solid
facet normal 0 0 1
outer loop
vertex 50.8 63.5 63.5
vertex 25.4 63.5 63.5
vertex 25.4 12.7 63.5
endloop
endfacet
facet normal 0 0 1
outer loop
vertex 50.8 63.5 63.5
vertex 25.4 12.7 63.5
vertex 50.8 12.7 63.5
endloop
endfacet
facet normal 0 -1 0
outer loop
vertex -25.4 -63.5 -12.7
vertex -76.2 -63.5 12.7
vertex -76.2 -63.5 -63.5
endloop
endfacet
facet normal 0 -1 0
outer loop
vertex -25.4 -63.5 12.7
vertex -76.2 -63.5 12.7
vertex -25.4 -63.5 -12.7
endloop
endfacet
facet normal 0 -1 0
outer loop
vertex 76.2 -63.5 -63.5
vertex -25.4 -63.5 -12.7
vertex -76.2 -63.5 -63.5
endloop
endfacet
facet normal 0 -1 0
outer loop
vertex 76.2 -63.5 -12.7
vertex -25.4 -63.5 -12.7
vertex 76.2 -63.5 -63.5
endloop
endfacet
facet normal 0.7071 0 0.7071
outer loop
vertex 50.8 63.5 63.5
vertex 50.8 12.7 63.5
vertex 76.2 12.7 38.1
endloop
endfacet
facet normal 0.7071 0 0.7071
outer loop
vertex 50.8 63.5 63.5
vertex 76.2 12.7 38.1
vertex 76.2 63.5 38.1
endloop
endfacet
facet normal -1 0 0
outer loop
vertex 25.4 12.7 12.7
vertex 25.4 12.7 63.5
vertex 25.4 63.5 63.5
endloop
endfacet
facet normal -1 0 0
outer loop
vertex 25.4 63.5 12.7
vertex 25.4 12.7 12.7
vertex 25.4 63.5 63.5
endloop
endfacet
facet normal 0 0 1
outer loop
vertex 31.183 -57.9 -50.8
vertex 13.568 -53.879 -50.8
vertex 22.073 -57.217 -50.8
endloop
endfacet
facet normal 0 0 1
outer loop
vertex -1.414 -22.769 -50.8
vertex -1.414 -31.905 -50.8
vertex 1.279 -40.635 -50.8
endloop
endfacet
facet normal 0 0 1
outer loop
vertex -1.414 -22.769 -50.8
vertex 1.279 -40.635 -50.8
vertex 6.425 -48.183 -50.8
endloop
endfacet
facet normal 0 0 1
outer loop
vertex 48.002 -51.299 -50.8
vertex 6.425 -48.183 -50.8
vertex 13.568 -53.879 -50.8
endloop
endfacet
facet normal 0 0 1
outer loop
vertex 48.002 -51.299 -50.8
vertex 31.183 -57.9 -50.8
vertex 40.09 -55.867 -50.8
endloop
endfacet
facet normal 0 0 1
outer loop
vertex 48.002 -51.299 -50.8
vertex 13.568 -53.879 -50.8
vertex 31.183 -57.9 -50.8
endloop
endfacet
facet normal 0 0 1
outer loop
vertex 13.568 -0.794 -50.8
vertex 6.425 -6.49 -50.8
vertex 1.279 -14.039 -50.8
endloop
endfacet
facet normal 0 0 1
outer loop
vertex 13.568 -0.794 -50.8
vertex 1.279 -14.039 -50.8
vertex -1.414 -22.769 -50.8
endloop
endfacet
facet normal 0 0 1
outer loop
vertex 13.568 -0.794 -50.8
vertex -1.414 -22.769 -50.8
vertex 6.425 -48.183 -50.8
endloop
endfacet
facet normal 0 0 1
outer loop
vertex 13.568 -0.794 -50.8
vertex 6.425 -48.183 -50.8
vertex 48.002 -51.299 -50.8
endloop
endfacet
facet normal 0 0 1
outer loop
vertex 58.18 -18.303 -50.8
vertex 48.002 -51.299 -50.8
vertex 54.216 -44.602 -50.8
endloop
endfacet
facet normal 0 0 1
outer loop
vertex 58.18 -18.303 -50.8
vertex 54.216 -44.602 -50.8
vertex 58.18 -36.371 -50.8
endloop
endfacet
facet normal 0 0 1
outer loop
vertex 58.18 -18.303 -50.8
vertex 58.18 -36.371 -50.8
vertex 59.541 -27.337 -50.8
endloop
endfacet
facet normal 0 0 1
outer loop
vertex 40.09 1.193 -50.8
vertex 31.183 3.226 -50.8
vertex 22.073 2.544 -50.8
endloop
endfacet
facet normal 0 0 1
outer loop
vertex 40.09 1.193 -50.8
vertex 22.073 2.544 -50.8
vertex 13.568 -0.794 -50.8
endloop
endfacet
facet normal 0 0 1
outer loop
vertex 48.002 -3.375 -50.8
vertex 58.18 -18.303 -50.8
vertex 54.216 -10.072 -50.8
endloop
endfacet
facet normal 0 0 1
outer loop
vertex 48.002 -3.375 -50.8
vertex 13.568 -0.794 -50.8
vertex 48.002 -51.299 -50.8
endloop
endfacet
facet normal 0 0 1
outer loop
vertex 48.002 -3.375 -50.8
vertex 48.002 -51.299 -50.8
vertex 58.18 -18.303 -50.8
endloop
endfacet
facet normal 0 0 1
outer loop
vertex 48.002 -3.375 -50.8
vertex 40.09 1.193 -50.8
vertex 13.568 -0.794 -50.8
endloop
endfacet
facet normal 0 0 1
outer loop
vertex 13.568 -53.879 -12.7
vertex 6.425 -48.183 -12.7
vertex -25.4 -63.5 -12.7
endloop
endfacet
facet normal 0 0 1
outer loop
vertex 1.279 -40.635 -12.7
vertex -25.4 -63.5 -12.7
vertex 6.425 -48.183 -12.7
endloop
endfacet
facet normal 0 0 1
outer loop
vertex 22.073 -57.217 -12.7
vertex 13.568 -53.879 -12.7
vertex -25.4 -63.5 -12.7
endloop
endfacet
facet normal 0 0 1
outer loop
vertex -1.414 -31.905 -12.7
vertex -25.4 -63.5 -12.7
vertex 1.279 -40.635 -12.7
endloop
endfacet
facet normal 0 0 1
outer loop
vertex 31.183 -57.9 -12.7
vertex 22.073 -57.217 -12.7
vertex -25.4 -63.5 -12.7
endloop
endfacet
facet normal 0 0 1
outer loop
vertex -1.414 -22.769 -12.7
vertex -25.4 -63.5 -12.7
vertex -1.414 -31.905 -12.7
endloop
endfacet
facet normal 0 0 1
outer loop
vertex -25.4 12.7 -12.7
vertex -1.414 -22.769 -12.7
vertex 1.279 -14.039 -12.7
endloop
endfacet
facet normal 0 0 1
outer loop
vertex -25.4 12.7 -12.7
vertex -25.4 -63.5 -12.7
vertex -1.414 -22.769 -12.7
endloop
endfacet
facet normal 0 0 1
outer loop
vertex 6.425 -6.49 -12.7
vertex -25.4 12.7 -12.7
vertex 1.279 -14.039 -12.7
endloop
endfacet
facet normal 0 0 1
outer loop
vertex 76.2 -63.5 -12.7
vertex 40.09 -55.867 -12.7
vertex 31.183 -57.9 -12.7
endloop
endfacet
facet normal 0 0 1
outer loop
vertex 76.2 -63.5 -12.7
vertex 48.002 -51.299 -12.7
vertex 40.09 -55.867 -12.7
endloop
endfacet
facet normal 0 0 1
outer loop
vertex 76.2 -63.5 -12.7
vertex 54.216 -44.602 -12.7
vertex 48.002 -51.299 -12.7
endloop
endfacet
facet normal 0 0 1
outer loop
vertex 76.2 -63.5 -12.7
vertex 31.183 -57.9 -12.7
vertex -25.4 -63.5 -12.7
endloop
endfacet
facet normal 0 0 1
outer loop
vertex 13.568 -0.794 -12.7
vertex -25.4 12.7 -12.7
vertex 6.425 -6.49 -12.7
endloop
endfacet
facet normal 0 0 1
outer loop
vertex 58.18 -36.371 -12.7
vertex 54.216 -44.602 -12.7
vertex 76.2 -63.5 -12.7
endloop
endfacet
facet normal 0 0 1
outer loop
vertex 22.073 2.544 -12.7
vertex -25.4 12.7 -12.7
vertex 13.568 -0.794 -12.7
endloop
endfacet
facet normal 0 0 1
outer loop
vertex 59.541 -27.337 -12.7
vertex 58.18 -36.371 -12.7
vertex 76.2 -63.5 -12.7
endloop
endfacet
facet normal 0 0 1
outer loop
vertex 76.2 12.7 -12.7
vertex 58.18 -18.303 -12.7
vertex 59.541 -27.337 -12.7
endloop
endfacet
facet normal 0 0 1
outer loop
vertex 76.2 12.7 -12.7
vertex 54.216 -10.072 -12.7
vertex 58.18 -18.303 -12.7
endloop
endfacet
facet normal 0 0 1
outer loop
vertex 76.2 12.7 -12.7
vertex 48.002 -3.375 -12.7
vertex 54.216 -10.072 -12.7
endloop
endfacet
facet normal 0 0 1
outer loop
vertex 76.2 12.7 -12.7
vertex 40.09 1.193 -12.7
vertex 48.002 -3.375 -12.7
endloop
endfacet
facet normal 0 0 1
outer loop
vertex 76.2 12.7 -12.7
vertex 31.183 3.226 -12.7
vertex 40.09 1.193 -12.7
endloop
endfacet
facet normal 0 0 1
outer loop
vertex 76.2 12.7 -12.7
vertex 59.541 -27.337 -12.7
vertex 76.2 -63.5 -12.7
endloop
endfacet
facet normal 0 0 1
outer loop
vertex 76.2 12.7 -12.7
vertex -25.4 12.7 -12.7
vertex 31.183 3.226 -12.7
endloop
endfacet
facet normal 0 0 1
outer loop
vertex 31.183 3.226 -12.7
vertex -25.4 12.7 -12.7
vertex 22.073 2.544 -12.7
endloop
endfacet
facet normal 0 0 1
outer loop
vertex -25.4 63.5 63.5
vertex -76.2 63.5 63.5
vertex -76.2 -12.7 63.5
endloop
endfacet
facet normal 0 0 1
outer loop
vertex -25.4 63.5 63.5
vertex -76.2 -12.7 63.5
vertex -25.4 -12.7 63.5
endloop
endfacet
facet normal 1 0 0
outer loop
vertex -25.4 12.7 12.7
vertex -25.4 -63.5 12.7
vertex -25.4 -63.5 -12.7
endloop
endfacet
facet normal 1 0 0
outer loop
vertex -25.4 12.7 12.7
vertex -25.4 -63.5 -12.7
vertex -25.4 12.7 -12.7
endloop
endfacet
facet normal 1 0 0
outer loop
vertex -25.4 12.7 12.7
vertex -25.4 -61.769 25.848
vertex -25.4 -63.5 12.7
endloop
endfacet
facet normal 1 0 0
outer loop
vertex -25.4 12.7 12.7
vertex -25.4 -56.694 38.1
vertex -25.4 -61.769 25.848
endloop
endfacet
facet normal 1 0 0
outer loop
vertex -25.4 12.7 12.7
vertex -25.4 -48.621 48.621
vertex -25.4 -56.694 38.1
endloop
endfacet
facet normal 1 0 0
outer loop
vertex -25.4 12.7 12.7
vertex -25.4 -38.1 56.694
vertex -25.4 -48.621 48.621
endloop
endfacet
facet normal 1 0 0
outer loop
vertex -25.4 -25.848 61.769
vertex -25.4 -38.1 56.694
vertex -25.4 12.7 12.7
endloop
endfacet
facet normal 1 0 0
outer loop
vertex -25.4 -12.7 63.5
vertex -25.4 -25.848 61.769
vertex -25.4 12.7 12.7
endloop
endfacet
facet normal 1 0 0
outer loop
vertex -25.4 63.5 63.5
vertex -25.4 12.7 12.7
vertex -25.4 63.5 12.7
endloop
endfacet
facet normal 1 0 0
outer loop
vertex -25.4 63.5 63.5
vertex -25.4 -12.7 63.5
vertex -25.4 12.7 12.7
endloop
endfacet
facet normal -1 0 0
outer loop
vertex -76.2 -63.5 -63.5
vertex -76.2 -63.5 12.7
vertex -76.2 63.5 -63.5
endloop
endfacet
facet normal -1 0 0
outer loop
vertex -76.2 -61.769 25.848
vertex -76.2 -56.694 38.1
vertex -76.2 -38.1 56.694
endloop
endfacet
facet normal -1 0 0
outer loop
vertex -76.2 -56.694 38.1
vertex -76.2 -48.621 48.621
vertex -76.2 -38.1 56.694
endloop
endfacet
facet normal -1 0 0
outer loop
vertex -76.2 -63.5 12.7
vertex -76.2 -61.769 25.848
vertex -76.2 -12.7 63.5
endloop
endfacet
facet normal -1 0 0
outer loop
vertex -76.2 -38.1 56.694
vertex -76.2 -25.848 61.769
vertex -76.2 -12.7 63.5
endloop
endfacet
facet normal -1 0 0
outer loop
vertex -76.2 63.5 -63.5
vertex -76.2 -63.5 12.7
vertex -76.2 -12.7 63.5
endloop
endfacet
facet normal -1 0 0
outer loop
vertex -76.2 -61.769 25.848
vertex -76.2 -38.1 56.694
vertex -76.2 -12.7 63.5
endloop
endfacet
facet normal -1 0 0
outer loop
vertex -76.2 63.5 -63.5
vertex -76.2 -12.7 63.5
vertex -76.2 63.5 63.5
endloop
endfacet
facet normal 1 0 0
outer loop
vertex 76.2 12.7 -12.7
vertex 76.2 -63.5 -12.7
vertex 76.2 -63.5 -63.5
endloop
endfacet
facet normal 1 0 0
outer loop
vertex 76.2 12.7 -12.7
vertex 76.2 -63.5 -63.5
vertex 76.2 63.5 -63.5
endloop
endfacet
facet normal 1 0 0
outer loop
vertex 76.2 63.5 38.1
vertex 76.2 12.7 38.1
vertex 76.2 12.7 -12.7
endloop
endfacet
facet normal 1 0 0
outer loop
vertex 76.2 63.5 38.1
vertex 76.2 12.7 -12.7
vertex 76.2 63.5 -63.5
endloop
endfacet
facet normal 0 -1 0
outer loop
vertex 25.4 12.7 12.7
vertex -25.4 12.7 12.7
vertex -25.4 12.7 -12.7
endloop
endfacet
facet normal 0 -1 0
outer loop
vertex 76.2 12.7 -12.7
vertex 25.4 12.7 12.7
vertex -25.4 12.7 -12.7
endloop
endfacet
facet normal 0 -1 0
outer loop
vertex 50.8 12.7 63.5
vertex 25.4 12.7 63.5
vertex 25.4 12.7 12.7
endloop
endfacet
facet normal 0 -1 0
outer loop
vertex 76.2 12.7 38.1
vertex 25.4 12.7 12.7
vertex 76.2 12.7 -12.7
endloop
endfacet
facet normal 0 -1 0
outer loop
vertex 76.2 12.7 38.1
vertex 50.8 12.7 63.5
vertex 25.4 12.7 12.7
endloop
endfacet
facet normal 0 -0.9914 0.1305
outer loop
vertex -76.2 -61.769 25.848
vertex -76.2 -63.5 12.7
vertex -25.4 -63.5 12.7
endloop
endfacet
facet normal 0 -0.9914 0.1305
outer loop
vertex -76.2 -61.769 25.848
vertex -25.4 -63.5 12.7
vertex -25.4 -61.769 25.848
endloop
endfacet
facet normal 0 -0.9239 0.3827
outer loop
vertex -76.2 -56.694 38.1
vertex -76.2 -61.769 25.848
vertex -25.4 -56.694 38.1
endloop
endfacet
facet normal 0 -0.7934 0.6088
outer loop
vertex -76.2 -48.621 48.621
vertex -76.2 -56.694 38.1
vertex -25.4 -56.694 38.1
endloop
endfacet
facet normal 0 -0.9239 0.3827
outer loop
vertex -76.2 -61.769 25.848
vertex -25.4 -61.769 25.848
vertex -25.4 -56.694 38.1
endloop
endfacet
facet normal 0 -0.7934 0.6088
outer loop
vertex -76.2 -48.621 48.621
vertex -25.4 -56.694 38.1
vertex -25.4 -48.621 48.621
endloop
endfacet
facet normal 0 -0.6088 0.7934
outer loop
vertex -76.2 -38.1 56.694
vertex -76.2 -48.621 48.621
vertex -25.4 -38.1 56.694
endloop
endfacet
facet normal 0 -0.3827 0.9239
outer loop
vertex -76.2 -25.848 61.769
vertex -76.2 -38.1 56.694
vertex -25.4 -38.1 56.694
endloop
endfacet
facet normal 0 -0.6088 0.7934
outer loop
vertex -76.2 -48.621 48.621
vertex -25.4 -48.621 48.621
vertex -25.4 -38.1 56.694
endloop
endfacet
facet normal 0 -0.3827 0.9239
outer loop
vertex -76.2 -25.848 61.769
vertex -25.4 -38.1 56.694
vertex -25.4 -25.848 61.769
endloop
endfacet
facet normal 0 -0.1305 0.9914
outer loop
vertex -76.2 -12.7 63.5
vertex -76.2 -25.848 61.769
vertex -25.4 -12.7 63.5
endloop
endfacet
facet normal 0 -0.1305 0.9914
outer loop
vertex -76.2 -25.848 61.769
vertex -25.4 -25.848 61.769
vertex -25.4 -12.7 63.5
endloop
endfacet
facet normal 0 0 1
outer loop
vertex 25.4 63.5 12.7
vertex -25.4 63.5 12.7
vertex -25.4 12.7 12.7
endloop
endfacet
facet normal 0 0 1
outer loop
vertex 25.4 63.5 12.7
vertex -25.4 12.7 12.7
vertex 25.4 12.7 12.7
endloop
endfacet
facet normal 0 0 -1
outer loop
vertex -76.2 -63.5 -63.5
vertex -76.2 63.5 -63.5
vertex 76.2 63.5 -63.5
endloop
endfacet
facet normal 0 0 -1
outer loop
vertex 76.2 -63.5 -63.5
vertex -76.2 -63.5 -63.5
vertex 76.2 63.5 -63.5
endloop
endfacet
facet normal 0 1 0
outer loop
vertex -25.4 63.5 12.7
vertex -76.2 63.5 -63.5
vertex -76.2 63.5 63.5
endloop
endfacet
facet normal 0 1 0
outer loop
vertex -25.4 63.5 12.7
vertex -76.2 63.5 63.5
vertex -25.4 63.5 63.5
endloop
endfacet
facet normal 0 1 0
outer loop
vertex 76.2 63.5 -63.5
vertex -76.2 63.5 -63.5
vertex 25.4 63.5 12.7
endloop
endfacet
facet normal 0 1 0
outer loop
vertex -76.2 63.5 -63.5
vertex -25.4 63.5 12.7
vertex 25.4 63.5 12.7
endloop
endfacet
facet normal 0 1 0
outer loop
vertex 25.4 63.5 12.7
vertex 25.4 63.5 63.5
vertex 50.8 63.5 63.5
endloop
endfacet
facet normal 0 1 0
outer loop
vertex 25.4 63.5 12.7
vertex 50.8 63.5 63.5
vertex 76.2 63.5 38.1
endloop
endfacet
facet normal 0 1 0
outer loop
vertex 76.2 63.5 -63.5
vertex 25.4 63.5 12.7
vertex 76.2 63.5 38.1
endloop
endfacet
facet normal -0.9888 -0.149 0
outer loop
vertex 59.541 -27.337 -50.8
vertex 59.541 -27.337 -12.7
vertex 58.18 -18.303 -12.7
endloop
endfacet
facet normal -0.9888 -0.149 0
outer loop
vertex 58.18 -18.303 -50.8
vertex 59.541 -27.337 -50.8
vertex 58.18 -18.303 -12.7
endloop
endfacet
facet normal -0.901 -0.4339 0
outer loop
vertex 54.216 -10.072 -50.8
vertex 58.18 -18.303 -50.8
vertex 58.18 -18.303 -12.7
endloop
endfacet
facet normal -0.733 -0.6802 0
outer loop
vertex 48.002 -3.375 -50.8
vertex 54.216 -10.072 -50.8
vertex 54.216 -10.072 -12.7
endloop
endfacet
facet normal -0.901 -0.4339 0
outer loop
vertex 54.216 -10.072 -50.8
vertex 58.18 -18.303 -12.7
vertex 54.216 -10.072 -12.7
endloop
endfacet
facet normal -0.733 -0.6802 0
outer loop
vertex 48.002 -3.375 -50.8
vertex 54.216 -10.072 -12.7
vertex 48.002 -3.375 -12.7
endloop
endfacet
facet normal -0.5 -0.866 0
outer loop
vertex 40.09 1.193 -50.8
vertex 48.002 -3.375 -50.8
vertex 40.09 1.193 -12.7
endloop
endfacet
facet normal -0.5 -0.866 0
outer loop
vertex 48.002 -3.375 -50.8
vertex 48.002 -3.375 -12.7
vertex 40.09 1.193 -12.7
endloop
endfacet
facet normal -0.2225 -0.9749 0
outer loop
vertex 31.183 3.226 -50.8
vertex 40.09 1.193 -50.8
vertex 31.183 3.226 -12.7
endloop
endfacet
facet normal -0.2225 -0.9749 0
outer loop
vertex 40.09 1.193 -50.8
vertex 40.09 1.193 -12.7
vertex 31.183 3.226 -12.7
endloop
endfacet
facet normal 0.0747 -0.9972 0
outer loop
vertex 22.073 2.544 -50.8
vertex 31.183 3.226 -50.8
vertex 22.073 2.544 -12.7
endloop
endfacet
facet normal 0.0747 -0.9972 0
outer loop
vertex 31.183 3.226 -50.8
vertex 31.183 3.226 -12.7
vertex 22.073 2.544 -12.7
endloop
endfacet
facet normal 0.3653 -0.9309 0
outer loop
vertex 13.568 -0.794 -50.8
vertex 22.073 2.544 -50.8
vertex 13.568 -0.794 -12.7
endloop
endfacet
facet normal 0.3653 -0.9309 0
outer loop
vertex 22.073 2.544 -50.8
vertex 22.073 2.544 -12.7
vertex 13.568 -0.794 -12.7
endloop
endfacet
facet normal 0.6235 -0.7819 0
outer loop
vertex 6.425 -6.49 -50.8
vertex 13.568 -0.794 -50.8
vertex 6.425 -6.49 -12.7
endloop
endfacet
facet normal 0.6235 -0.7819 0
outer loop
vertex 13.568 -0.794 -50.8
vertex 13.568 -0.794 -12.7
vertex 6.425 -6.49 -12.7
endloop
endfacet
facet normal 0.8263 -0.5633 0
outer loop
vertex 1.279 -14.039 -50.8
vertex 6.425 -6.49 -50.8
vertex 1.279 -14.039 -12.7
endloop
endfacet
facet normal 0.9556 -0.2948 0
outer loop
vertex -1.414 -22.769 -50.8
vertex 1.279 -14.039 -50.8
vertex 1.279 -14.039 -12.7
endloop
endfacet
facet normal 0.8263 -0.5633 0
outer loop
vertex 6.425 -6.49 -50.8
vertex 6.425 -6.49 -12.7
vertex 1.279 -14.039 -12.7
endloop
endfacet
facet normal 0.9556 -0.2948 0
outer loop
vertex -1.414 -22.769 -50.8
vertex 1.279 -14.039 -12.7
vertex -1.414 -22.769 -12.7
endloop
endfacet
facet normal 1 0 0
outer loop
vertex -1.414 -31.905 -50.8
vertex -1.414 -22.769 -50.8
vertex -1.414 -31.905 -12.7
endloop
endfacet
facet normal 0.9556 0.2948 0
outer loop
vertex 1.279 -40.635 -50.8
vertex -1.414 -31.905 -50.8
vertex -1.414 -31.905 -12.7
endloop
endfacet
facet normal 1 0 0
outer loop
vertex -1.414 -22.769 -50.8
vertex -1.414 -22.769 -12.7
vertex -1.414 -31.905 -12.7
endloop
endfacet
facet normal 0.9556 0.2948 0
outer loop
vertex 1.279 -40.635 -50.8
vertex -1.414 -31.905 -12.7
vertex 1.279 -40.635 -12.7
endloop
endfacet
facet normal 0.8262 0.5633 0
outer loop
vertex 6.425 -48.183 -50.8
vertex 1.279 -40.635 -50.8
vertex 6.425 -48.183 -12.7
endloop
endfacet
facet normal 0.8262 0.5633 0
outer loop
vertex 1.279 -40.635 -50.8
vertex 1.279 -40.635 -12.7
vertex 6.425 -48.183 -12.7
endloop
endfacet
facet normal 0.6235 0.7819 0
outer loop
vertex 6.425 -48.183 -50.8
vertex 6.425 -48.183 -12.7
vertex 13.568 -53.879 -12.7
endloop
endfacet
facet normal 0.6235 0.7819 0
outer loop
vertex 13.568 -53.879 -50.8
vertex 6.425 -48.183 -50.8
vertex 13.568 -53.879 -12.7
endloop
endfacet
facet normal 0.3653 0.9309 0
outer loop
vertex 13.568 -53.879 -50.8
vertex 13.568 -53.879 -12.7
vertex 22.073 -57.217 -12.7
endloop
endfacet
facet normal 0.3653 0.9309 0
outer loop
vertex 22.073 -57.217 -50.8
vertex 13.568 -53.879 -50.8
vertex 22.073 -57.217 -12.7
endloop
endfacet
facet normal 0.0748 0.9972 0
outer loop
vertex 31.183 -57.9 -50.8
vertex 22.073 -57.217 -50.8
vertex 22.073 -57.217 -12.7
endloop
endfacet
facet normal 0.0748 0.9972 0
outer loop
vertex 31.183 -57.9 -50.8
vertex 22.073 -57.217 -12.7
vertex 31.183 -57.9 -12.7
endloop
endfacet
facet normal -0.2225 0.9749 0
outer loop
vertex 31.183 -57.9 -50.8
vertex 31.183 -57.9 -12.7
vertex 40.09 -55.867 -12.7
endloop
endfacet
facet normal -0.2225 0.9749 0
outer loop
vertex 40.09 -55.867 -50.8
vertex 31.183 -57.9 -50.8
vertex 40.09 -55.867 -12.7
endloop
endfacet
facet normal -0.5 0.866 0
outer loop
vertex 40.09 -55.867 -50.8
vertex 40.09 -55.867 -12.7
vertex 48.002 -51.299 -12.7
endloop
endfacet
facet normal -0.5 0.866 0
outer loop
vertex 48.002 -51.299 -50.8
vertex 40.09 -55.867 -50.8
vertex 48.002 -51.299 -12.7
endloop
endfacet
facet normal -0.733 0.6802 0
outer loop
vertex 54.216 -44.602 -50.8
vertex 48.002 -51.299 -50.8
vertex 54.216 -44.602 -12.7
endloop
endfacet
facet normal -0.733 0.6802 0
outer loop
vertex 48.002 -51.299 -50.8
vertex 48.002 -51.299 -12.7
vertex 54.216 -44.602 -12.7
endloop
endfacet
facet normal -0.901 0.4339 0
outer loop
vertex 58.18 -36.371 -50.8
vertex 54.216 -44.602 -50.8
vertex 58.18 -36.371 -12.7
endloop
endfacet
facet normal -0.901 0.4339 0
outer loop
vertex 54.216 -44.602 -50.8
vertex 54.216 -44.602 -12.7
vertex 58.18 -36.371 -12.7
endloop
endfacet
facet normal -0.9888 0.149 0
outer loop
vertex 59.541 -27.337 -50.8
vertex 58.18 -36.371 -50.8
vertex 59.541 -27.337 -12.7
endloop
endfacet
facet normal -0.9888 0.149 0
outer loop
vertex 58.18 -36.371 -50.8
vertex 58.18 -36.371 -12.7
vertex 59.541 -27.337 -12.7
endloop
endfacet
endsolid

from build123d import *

# Parameters (mm, degrees)
F0_W     = 152.4
F0_H     = 127
F1_DEPTH = 63.5
F2_W     = 101.6
F2_H     = 76.2
F3_DEPTH = 76.2
F4_R     = 50.8
F5_R     = 30.648749
F6_DEPTH = 38.1
F7_W     = 50.8
F7_H     = 50.8
F8_DEPTH = 50.8
F9_SIZE  = 25.4


with BuildPart() as f1:
    # F0 (on Top) → F1 (new body, symmetric)
    with BuildSketch(Plane.XY):
        Rectangle(F0_W, F0_H)
    extrude(amount=F1_DEPTH, both=True)

    # F2 (on face) → F3 (cut)
    with BuildSketch(Plane.XY.offset(63.5)):
        with Locations((25.4, -25.4)):
            Rectangle(F2_W, F2_H)
    extrude(amount=-F3_DEPTH, mode=Mode.SUBTRACT)

    # F4
    f4_edges = [f1.edges().sort_by_distance(p)[0] for p in [
        (-50.8, -63.5, 63.5),
    ]]
    fillet(f4_edges, radius=F4_R)

    # F5 (on face) → F6 (cut)
    with BuildSketch(Plane.XY.offset(-12.7)):
        with Locations((28.892498, -27.33675)):
            Circle(F5_R)
    extrude(amount=-F6_DEPTH, mode=Mode.SUBTRACT)

    # F7 (on face) → F8 (cut)
    with BuildSketch(Plane.XY.offset(63.5)):
        with Locations((0, 38.1)):
            Rectangle(F7_W, F7_H)
    extrude(amount=-F8_DEPTH, mode=Mode.SUBTRACT)

    # F9
    f9_edges = [f1.edges().sort_by_distance(p)[0] for p in [
        (76.2, 38.1, 63.5),
    ]]
    chamfer(f9_edges, length=F9_SIZE)


solid = f1.part
